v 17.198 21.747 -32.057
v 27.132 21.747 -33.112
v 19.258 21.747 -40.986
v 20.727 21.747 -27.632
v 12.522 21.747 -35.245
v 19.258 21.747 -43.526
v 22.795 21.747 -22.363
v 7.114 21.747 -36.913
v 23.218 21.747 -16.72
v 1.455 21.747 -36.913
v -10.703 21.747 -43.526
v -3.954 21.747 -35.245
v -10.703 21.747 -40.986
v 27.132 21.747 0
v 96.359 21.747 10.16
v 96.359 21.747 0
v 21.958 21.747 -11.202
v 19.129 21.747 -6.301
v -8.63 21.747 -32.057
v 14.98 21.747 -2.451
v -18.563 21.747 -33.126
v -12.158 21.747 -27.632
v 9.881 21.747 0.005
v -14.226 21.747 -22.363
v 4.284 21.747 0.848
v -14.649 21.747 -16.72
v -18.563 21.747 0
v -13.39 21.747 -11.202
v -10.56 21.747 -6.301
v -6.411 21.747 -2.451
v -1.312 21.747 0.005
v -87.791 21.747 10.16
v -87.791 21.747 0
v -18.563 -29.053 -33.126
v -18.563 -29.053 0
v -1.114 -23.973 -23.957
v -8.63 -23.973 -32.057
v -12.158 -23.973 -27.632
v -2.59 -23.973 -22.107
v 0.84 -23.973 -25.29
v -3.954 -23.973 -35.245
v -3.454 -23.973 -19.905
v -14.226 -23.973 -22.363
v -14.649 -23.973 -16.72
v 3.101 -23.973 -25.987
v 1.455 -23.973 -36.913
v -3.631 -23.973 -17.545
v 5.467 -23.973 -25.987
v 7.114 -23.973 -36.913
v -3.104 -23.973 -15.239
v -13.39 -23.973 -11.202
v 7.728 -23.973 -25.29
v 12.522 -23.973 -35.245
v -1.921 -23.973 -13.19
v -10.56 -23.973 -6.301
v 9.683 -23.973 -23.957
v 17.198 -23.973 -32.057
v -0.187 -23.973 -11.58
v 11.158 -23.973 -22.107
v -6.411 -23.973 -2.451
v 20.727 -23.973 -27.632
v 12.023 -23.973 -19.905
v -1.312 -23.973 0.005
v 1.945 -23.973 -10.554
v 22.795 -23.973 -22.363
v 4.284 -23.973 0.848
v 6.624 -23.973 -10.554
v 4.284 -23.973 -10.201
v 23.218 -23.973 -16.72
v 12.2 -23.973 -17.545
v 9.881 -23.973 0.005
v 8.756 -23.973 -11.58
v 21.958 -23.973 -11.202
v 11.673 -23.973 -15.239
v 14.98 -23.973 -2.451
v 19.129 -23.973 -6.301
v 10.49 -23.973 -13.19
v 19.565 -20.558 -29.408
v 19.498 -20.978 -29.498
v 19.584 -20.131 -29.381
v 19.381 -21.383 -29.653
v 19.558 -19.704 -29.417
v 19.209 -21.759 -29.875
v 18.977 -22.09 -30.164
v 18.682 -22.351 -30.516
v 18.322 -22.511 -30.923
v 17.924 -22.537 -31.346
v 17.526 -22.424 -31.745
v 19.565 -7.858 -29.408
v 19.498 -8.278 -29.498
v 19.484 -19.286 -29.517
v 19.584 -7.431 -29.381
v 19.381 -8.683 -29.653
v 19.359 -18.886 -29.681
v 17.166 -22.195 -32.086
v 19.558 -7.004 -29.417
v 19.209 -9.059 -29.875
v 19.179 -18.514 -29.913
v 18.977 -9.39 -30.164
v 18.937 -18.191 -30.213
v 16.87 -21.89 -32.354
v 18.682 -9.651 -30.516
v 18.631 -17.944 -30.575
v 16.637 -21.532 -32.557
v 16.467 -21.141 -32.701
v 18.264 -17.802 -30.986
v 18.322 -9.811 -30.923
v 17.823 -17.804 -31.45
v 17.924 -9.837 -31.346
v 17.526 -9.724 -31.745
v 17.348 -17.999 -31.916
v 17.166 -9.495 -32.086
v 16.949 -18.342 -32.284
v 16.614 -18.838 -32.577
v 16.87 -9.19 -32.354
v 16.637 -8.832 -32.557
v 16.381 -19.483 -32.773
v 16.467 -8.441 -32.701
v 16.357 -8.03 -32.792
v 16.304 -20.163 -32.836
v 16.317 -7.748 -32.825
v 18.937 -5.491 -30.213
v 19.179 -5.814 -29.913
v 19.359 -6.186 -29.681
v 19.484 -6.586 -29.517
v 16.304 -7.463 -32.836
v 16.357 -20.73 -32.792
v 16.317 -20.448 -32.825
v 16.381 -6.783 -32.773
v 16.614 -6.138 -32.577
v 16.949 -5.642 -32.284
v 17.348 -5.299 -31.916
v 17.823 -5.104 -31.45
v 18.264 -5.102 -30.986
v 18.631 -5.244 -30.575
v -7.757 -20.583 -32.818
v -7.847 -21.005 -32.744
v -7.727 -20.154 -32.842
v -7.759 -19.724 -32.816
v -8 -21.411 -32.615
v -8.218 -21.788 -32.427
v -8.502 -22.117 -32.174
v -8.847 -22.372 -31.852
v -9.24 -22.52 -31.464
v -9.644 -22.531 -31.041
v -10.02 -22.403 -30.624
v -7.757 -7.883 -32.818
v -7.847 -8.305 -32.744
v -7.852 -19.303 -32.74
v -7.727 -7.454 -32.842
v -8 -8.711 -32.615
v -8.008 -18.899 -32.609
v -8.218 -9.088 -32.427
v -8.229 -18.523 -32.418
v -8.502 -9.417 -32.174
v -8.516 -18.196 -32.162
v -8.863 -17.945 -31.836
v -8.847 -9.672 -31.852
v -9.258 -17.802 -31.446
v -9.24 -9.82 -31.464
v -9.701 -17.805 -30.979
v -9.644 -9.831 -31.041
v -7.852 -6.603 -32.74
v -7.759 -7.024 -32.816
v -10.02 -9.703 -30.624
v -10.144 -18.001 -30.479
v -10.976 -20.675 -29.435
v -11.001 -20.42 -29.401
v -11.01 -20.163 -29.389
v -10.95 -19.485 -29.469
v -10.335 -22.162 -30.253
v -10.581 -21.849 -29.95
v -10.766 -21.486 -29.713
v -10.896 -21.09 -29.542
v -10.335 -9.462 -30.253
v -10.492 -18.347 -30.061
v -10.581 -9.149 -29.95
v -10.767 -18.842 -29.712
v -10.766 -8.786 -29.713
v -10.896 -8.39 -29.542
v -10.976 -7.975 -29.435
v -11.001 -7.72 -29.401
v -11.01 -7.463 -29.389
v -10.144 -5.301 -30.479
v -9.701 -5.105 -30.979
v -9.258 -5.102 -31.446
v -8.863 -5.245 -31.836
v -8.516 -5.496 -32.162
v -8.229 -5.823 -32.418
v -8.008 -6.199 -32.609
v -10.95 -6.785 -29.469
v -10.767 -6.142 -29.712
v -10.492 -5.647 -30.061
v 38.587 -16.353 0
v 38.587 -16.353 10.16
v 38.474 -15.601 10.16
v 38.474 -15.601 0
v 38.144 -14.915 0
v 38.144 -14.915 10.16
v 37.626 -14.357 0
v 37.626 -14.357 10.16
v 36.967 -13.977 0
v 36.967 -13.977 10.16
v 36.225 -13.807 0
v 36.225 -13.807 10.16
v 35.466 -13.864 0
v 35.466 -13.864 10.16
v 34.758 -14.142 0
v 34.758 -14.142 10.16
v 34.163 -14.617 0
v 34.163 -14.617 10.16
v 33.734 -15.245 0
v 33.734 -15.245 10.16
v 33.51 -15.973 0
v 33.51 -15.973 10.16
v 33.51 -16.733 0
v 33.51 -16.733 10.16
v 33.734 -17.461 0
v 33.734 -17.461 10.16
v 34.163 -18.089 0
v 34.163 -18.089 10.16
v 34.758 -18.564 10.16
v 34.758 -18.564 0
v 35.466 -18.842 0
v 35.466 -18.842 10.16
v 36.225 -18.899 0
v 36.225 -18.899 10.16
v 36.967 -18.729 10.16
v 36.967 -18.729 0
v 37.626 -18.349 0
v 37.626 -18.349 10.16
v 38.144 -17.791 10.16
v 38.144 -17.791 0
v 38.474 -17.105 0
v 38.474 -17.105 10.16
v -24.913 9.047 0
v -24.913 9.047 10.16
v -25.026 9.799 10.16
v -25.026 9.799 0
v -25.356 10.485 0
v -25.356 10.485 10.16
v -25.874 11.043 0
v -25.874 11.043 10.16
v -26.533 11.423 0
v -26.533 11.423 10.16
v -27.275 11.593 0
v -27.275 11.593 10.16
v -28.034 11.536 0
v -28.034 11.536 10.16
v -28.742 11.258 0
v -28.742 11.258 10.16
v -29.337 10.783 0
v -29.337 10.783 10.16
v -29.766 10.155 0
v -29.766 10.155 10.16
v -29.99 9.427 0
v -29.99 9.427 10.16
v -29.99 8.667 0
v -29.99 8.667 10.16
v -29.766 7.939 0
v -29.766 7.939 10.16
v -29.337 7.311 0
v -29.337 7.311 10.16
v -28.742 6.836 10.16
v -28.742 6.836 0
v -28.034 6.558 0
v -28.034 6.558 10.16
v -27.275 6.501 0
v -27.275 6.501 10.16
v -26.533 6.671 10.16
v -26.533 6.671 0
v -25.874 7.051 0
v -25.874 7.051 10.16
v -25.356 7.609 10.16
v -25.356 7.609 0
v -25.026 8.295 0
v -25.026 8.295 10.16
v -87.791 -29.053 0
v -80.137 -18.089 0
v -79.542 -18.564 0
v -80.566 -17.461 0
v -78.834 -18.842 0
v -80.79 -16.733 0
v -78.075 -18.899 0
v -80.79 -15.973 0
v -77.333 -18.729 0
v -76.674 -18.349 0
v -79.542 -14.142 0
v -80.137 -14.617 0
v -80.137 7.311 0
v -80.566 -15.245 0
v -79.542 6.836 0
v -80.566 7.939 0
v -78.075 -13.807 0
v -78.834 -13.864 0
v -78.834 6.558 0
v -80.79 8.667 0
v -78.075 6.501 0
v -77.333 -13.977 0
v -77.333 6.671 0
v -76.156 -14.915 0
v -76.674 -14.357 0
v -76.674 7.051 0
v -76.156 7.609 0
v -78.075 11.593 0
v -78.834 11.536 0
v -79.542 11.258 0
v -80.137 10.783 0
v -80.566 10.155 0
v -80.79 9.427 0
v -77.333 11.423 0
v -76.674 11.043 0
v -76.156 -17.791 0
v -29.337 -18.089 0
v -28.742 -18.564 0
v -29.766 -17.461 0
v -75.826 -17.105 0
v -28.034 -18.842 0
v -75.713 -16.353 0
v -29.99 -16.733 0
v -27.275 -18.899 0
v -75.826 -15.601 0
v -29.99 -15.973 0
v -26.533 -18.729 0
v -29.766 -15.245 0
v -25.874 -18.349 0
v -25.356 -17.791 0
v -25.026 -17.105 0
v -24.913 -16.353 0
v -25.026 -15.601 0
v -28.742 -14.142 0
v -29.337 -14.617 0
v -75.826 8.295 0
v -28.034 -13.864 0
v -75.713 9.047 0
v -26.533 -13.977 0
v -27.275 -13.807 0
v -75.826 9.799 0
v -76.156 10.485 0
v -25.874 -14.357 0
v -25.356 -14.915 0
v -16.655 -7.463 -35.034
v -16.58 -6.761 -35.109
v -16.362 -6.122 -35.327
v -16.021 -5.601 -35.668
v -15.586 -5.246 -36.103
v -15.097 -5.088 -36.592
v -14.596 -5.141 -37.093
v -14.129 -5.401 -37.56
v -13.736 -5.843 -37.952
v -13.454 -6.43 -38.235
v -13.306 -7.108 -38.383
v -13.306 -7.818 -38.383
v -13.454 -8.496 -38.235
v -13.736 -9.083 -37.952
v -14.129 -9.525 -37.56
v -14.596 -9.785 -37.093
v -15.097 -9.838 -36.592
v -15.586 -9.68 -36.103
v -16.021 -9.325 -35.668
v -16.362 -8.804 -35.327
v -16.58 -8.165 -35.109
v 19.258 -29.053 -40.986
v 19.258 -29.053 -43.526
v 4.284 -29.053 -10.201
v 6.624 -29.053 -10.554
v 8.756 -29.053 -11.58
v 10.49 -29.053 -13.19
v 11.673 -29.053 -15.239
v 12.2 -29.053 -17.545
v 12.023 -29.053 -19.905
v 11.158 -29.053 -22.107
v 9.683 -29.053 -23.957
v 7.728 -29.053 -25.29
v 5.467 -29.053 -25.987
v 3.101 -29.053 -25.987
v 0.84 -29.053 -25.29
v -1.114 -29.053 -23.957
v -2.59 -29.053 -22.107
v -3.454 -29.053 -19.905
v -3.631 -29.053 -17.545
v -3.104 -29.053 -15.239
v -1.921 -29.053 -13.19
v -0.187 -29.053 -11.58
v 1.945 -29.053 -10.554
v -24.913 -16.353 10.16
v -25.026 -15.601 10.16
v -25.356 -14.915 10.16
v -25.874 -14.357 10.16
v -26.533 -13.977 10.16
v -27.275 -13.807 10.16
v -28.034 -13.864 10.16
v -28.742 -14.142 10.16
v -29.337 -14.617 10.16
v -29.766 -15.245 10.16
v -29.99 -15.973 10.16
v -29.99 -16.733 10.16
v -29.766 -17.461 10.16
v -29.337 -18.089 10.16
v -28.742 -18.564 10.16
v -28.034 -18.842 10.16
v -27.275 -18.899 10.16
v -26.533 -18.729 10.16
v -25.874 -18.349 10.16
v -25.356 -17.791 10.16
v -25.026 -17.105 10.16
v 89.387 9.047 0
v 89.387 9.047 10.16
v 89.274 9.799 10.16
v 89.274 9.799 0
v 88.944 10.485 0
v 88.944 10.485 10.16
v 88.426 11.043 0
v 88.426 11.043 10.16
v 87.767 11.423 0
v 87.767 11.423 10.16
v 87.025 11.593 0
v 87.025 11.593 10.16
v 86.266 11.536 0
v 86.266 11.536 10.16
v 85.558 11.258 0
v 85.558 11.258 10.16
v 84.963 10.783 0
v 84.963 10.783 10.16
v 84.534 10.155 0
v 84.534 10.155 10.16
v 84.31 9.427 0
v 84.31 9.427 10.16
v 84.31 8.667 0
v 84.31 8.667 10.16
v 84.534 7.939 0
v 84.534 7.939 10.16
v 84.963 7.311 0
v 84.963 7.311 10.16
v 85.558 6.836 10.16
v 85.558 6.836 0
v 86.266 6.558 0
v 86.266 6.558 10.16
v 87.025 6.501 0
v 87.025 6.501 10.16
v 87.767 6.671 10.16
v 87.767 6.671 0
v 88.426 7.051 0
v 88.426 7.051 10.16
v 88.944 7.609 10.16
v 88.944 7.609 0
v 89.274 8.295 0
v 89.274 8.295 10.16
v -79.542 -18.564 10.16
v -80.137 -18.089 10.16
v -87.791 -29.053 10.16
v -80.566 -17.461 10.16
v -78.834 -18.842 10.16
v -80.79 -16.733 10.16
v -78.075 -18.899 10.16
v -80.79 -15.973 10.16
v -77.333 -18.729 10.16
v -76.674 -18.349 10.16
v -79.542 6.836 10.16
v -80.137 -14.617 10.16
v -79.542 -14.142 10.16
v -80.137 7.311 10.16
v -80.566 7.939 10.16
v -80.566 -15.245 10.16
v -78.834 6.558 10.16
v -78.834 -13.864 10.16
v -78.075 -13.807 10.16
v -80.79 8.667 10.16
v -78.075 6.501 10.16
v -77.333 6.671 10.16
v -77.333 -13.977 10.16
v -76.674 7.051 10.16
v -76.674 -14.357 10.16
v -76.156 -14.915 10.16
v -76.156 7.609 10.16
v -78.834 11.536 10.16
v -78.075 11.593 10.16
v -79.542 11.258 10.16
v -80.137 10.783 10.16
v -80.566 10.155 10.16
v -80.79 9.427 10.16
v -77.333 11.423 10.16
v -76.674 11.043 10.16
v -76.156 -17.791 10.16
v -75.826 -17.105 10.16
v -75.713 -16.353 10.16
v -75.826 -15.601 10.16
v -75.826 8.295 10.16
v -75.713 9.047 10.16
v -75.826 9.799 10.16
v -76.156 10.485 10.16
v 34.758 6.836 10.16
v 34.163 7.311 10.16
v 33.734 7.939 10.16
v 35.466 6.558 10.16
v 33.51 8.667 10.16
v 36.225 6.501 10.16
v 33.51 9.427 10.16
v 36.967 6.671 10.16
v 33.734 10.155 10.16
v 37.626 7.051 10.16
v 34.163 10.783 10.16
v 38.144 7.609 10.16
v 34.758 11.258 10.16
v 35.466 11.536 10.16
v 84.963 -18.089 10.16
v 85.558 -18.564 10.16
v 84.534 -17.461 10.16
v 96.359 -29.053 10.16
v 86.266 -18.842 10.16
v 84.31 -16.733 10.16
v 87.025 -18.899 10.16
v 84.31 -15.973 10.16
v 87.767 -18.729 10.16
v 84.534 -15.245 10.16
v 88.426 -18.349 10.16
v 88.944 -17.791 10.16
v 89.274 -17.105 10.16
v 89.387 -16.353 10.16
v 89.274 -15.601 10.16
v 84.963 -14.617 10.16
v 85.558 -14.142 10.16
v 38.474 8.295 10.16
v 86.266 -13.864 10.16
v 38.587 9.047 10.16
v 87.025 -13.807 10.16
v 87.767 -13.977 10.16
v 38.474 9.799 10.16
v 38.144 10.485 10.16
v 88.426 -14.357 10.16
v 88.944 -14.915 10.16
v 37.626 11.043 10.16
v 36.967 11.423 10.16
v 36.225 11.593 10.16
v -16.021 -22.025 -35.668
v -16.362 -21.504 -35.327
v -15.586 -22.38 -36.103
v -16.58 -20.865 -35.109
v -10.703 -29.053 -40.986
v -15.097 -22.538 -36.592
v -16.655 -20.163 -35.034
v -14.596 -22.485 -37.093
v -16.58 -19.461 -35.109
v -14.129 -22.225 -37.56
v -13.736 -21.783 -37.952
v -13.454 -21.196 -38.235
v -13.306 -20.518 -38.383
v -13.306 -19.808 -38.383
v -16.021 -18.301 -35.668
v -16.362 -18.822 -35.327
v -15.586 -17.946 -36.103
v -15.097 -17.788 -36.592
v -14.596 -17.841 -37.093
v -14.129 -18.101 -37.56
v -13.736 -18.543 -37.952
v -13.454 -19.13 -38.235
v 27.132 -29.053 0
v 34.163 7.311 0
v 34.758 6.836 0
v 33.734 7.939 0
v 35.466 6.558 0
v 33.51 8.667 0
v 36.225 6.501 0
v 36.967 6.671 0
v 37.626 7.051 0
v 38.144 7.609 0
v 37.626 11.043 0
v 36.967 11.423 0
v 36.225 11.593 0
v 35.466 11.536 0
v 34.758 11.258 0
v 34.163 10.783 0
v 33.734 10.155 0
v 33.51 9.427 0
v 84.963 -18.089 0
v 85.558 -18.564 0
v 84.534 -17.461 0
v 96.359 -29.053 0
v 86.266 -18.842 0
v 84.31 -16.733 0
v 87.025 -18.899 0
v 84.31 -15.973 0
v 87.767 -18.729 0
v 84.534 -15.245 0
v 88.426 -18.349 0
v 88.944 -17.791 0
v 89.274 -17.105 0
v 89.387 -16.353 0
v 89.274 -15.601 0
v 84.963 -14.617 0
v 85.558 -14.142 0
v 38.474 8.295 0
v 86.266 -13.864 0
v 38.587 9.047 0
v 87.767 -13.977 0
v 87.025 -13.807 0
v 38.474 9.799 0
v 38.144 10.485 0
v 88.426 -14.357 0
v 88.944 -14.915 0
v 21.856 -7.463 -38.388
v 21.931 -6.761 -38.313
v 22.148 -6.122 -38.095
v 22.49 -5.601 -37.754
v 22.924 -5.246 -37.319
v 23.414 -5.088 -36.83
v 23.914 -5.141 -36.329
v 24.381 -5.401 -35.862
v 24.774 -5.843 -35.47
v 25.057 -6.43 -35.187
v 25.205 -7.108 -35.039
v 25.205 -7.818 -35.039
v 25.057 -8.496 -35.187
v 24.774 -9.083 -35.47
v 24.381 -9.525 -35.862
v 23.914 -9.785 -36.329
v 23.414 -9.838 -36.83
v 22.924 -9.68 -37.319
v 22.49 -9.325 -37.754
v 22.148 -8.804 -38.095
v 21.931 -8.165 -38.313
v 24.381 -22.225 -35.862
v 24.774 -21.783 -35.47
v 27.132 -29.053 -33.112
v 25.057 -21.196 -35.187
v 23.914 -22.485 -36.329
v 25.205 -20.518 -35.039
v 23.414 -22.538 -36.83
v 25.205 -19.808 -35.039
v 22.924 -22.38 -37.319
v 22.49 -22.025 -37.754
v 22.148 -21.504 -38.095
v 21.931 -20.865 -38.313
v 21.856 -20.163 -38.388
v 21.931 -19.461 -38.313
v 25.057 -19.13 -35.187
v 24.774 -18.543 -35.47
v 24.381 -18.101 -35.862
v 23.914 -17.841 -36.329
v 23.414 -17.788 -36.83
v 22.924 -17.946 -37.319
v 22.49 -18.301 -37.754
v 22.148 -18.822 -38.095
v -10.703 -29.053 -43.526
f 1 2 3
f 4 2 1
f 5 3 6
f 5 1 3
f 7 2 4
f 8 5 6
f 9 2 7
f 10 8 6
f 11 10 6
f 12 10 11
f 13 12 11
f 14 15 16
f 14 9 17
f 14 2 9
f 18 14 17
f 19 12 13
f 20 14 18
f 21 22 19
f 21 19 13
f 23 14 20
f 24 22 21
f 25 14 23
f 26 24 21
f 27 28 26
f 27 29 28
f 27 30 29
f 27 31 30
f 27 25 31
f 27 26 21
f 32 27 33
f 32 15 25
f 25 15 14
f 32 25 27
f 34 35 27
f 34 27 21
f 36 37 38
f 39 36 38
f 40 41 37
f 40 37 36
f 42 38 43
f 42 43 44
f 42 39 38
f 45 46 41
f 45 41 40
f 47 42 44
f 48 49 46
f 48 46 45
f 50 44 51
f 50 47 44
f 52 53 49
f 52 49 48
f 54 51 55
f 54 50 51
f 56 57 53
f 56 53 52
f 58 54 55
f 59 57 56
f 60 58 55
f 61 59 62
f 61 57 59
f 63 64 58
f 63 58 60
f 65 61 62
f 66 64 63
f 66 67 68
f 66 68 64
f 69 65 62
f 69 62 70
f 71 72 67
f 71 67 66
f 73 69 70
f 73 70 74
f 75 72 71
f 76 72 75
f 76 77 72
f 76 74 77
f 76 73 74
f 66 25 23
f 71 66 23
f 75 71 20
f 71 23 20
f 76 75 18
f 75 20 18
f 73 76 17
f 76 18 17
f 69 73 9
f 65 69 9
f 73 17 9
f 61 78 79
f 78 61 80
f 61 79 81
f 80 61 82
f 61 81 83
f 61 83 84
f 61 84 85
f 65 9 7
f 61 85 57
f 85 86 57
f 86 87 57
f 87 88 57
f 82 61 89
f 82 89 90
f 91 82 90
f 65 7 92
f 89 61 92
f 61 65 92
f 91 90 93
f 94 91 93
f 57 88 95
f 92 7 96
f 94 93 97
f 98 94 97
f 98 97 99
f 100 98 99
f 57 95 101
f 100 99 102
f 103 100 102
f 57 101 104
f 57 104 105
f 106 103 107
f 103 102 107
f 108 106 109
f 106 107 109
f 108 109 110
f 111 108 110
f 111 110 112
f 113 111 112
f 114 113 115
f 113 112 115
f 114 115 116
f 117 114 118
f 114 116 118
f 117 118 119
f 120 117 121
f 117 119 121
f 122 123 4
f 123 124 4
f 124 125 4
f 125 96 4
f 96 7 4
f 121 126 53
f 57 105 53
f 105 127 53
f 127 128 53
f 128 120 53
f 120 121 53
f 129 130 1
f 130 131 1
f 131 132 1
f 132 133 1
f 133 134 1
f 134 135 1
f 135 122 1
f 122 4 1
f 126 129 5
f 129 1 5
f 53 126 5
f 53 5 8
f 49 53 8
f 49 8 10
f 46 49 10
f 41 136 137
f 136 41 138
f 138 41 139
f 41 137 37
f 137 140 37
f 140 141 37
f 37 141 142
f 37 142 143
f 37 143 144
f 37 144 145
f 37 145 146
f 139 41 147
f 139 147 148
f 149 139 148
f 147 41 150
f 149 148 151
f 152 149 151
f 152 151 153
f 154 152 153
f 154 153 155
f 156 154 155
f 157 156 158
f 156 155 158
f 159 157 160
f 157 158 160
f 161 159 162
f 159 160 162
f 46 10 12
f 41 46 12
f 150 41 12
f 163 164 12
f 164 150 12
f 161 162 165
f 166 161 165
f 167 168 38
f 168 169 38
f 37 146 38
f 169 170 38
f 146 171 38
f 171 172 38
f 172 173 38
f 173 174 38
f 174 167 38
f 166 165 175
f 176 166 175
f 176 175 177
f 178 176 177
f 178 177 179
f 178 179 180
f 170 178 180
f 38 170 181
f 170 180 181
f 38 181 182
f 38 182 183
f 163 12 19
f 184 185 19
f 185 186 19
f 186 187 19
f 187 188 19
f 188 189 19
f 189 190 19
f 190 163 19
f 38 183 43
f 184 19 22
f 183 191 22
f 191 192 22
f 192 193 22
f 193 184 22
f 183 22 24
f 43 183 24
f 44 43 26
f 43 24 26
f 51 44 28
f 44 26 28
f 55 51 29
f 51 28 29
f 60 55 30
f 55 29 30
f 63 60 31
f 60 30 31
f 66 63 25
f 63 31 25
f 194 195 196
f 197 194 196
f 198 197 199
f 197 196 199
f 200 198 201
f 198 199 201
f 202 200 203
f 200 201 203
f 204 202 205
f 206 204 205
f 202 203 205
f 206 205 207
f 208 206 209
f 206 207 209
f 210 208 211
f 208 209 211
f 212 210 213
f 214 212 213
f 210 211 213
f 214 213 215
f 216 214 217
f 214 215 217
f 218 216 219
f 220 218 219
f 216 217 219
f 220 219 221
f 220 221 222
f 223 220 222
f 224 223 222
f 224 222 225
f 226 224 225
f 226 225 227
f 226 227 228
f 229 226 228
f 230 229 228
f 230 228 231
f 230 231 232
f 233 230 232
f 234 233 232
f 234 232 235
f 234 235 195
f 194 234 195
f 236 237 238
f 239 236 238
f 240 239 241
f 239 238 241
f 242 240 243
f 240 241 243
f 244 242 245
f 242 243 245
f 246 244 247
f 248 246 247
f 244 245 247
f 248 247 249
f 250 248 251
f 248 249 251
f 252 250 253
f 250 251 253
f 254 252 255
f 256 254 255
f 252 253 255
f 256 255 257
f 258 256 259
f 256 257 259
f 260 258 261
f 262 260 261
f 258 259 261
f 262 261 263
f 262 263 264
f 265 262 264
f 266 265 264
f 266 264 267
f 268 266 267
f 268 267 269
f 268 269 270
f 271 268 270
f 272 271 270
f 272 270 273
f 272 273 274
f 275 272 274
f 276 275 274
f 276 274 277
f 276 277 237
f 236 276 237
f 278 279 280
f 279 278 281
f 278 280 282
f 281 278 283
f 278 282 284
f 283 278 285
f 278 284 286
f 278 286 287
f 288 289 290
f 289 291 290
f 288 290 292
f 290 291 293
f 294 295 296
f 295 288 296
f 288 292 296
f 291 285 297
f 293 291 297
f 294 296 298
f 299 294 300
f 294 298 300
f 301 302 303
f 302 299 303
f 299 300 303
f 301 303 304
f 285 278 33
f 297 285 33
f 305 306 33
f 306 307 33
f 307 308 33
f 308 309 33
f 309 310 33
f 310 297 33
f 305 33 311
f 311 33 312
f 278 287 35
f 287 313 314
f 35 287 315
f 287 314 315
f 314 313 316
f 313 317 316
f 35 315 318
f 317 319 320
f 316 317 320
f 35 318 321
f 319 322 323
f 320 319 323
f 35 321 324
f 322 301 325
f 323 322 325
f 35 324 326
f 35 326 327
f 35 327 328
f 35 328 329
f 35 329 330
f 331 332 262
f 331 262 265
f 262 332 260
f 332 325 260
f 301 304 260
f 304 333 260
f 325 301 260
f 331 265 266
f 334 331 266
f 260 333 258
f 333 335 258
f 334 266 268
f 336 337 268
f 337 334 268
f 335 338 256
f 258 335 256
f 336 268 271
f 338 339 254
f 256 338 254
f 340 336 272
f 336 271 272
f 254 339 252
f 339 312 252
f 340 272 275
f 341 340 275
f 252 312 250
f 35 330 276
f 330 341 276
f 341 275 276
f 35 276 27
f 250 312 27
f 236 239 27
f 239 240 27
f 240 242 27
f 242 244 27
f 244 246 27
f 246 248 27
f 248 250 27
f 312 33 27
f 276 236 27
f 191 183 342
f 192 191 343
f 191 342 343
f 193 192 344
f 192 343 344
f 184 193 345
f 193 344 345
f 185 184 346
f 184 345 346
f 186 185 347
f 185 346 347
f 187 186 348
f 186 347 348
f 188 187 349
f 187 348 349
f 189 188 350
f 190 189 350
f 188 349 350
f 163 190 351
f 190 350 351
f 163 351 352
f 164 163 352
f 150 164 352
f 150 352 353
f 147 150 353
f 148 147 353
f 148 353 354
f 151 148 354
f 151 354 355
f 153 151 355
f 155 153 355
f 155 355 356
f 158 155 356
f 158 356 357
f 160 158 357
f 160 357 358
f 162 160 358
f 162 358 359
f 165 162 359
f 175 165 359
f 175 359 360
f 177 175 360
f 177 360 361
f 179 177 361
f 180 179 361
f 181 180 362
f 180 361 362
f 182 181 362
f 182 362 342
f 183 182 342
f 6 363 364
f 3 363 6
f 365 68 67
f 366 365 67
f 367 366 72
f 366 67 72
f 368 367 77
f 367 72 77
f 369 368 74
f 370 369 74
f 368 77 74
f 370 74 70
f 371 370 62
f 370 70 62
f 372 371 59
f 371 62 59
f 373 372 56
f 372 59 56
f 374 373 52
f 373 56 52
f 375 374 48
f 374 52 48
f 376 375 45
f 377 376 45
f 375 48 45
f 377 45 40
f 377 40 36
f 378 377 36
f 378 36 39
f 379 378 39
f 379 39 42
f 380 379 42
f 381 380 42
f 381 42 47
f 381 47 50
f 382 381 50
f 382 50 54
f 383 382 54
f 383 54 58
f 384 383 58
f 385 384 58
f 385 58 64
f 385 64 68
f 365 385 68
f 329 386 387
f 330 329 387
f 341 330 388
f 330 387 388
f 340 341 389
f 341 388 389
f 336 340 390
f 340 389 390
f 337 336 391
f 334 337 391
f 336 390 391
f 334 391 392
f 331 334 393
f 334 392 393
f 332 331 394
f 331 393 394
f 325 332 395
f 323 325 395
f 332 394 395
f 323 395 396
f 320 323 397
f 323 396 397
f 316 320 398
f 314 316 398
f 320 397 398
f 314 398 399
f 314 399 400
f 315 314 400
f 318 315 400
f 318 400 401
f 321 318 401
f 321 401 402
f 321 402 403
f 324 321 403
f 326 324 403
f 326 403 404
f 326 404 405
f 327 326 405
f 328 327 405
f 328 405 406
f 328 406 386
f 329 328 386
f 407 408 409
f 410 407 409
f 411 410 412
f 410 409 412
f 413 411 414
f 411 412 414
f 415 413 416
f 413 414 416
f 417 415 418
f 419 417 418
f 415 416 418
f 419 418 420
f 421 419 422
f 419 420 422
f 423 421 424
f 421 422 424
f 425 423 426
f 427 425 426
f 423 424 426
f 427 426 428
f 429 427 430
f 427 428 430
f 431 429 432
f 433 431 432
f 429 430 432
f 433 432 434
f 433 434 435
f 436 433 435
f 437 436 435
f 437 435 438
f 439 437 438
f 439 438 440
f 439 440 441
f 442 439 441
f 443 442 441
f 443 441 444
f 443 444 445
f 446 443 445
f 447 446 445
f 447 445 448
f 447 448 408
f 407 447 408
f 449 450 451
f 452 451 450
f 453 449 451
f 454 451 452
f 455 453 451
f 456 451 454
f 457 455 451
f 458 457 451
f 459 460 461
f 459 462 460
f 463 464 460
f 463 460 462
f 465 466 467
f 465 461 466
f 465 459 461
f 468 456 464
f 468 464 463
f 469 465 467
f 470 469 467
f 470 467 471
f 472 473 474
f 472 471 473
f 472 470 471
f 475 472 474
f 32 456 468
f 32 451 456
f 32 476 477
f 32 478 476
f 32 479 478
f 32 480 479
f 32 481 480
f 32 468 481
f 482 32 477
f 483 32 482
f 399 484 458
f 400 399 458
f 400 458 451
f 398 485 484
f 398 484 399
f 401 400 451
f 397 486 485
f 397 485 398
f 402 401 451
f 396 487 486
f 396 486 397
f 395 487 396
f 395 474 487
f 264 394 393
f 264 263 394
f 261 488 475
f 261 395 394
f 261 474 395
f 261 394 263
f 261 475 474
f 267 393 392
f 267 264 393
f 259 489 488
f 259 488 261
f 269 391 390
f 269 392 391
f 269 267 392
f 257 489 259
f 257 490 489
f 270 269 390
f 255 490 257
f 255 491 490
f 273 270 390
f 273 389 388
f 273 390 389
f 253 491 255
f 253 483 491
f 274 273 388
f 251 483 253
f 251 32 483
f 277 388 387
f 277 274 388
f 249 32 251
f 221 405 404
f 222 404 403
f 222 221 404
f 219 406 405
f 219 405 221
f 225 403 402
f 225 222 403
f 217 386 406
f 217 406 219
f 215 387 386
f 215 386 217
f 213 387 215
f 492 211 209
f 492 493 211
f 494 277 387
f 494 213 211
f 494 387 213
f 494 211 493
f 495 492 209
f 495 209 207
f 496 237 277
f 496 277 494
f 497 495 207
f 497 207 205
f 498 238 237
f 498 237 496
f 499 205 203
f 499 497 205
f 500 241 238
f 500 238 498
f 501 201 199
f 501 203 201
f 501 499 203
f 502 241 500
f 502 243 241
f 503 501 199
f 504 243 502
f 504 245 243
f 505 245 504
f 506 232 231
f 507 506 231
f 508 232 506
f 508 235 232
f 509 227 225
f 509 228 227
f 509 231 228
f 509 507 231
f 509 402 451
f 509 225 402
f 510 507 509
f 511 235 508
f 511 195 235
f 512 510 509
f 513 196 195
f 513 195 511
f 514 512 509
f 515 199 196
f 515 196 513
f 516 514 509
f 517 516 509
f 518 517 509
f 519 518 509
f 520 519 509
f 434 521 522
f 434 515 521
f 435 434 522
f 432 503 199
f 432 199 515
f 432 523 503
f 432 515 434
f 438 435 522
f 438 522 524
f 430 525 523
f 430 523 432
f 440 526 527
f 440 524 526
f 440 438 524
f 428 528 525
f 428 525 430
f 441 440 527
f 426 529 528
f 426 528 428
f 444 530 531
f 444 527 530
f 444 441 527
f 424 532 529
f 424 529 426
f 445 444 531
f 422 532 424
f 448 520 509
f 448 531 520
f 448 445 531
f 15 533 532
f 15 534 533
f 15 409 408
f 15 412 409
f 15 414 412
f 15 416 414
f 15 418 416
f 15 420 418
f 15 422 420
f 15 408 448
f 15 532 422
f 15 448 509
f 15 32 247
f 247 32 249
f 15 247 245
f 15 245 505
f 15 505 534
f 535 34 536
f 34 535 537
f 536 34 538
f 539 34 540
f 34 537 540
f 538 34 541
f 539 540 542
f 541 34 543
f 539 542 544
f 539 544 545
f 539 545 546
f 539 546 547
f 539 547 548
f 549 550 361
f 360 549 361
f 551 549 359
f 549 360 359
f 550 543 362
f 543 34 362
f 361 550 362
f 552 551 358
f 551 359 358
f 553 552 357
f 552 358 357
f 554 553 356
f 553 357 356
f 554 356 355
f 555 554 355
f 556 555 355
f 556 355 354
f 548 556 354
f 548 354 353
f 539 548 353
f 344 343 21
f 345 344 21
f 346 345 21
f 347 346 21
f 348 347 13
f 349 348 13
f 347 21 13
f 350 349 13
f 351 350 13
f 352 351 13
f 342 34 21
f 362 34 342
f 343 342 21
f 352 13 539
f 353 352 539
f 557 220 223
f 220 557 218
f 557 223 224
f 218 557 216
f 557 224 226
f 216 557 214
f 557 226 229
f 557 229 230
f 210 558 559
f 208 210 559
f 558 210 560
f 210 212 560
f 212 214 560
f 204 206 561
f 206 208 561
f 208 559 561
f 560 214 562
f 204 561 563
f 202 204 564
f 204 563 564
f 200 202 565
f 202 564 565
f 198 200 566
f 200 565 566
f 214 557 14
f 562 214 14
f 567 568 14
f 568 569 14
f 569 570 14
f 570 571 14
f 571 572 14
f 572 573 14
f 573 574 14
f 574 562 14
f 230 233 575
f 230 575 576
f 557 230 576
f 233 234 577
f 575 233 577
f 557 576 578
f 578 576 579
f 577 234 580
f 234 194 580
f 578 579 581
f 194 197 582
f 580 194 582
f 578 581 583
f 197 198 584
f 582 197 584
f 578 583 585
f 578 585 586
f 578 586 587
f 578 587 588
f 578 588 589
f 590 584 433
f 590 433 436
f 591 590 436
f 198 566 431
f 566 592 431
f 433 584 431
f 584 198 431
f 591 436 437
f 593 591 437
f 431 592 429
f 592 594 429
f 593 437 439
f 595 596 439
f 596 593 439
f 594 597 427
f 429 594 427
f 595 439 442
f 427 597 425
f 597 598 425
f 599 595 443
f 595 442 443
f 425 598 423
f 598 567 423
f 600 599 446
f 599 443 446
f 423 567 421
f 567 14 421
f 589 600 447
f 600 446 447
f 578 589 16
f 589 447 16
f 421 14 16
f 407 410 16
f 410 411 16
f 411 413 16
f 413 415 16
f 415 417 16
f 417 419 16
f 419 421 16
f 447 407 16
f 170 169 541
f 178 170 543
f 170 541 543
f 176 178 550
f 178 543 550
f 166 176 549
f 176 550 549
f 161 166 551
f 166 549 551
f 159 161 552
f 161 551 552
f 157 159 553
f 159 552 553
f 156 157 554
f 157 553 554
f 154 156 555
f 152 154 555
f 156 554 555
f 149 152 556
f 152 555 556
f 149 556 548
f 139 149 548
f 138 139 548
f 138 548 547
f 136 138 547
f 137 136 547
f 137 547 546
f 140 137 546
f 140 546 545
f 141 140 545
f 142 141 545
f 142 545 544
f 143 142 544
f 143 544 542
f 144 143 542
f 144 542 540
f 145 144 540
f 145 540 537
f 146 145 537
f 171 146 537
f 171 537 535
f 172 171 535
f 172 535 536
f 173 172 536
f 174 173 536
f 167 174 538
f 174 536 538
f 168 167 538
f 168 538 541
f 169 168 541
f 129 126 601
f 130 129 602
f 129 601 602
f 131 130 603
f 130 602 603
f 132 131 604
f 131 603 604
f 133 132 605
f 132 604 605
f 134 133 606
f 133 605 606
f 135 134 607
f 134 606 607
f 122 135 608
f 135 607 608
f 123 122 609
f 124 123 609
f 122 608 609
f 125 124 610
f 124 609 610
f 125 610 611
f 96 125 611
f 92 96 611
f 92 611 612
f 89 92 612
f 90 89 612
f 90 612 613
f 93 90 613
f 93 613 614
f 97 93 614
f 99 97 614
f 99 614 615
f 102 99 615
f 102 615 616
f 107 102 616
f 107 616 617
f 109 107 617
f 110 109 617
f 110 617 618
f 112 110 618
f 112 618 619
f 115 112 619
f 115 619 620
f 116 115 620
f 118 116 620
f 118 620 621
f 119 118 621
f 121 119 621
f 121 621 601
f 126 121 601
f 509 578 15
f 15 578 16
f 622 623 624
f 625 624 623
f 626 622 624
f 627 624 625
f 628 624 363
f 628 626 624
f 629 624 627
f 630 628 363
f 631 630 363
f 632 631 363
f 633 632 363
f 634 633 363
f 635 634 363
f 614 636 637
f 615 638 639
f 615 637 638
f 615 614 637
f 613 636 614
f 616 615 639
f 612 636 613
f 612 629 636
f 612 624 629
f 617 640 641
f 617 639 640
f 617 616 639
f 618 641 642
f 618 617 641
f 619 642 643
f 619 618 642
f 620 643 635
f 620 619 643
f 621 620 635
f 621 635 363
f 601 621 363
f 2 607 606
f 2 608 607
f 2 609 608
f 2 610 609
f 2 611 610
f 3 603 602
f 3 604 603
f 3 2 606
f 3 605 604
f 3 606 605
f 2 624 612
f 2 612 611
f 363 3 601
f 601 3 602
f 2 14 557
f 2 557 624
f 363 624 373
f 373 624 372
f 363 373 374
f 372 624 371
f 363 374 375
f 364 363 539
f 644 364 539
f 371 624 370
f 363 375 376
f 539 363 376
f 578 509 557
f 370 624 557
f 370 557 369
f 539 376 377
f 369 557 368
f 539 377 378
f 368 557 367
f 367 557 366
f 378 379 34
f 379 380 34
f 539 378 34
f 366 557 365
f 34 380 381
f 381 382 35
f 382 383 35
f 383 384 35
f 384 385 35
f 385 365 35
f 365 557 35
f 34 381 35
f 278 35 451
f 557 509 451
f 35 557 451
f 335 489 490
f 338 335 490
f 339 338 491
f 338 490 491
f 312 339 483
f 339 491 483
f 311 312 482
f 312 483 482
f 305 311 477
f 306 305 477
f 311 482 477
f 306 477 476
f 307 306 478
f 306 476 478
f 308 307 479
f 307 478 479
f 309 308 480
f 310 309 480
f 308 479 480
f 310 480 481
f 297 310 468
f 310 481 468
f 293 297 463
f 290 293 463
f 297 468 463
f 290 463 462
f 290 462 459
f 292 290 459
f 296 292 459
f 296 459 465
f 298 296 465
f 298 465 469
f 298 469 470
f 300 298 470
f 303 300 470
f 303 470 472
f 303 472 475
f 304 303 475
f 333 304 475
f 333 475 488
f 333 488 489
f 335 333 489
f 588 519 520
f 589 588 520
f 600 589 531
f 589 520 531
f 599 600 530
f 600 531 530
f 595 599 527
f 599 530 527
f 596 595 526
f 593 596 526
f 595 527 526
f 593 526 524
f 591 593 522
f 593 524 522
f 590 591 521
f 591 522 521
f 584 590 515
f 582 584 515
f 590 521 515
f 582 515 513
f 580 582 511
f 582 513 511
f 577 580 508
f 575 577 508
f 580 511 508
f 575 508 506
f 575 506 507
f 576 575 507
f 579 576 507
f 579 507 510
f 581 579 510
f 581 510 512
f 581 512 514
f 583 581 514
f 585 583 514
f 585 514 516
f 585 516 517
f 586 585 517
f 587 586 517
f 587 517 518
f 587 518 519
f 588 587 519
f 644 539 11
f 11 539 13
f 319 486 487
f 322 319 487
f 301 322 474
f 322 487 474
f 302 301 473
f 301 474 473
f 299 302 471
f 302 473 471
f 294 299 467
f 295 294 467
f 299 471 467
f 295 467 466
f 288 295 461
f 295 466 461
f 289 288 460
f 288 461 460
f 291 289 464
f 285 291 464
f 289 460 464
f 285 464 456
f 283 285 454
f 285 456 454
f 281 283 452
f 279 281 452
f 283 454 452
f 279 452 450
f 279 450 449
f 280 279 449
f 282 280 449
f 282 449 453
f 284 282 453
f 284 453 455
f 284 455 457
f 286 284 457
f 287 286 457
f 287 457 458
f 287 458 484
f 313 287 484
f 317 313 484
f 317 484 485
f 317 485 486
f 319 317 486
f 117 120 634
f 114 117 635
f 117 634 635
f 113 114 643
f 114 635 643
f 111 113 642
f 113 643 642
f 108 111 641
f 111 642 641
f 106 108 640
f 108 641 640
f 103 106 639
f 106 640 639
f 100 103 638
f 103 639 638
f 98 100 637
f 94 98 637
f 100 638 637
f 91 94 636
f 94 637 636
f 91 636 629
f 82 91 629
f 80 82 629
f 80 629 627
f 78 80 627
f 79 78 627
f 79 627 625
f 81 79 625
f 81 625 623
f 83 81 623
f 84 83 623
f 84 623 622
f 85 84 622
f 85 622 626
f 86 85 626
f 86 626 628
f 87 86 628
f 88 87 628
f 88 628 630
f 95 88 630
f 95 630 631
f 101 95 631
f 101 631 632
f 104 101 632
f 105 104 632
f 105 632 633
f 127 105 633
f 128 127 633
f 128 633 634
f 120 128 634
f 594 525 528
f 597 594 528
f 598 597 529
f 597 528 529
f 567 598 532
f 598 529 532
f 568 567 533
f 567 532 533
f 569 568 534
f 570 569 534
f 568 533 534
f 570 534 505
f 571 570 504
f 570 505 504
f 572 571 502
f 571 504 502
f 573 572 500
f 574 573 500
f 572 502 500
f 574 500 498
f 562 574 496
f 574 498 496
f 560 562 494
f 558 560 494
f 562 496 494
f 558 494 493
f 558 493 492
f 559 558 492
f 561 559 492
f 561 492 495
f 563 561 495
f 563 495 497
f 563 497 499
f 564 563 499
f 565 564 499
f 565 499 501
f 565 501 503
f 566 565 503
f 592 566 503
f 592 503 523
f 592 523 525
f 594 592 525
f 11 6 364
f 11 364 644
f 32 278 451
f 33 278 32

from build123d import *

# Parameters (mm, degrees)
SKETCH1_W                           = 184.15
SKETCH1_H                           = 50.8
BOSS_EXTRUDE1_DEPTH                 = 10.16
CUT_EXTRUDE1_DEPTH                  = 110.402922012
CUT_EXTRUDE1_DEPTH_BACK             = 110.402922012
SKETCH7_R                           = 22.847252038
BOSS_EXTRUDE2_DEPTH                 = 50.8
SKETCH8_R                           = 18.9865
CUT_EXTRUDE2_DEPTH                  = 45.72
SKETCH9_R                           = 7.9375
CUT_EXTRUDE3_DEPTH                  = 115.259711281
BOSS_EXTRUDE3_DEPTH                 = 50.8
BOSS_EXTRUDE4_START                 = -50.8
BOSS_EXTRUDE4_DEPTH                 = 50.8
BOSS_EXTRUDE5_START                 = -50.8
BOSS_EXTRUDE5_DEPTH                 = 50.8
CUT_EXTRUDE6_DEPTH                  = 117.385579957
F_10_CLEARANCE_HOLE1_D              = 5.1054
F_10_CLEARANCE_HOLE2_D              = 5.1054
SKETCH31_W                          = 29.960646913
SKETCH31_H                          = 50.8
BOSS_EXTRUDE6_DEPTH                 = 2.54
F_3_16_0_1875_DIAMETER_HOLE3_REACH  = 132.668
F_3_16_0_1875_DIAMETER_HOLE3_BORE_R = 2.38125
F_3_16_0_1875_DIAMETER_HOLE4_REACH  = 129.945
F_3_16_0_1875_DIAMETER_HOLE4_BORE_R = 2.38125


with BuildPart() as part:
    # Sketch1 → Boss-Extrude1 (new body)
    with BuildSketch(Plane.XY):
        with Locations((4.284398839, -3.653036721)):
            Rectangle(SKETCH1_W, SKETCH1_H)
    extrude(amount=BOSS_EXTRUDE1_DEPTH)

    # Sketch6 → Cut-Extrude1 (cut, two sides: drawn at the far end of the back side and taken through both)
    with BuildSketch(Plane(origin=(0, 21.746963279, 0), x_dir=(1, 0, 0), z_dir=(0, 1, 0)).offset(-CUT_EXTRUDE1_DEPTH_BACK)):
        with BuildLine():
            Line((189.051531618, 108.11571126), (10.888398839, 0))
            ThreePointArc((10.888398839, 0), (4.284398839, -1.847030056), (-2.319601161, 0))
            Line((-2.319601161, 0), (-180.48273394, 108.11571126))
            Line((-180.48273394, 108.11571126), (-180.48273394, 524.918345142))
            Line((-180.48273394, 524.918345142), (189.051531618, 524.918345142))
            Line((189.051531618, 524.918345142), (189.051531618, 108.11571126))
        make_face()
    extrude(amount=CUT_EXTRUDE1_DEPTH + CUT_EXTRUDE1_DEPTH_BACK, mode=Mode.SUBTRACT)

    # Sketch7 → Boss-Extrude2 (add, through all)
    with BuildSketch(Plane(origin=(0, 21.746963279, 0), x_dir=(1, 0, 0), z_dir=(0, 1, 0))):
        with Locations((4.284398839, 18.138470809)):
            Circle(SKETCH7_R)
    extrude(amount=-BOSS_EXTRUDE2_DEPTH)

    # Sketch8 → Cut-Extrude2 (cut)
    with BuildSketch(Plane(origin=(0, 21.746963279, 0), x_dir=(1, 0, 0), z_dir=(0, 1, 0))):
        with Locations(Location((4.284398839, 18.138470809, 0), (0, 0, 270))):
            Circle(SKETCH8_R)
    extrude(amount=-CUT_EXTRUDE2_DEPTH, mode=Mode.SUBTRACT)

    # Sketch9 → Cut-Extrude3 (cut, through all)
    with BuildSketch(Plane(origin=(0, -23.973036721, 0), x_dir=(1, 0, 0), z_dir=(0, 1, 0))):
        with Locations(Location((4.284398839, 18.138470809, 0), (0, 0, 270))):
            Circle(SKETCH9_R)
    extrude(amount=-CUT_EXTRUDE3_DEPTH, mode=Mode.SUBTRACT)

    # Sketch12 → Boss-Extrude3 (add)
    with BuildSketch(Plane(origin=(0, 21.746963279, 0), x_dir=(1, 0, 0), z_dir=(0, 1, 0))):
        with BuildLine():
            Line((27.131650877, 18.138470763), (27.131650877, 0))
            Line((27.131650877, 0), (18.176583779, 0))
            ThreePointArc((18.176583779, 0), (24.770920949, 8.024157287), (27.131650877, 18.138470763))
        make_face()
        with BuildLine():
            Line((-18.562853199, 18.138470775), (-18.562853199, 0))
            Line((-18.562853199, 0), (-9.607786101, 0))
            ThreePointArc((-9.607786101, 0), (-16.202123271, 8.024157294), (-18.562853199, 18.138470775))
        make_face()
    extrude(amount=-BOSS_EXTRUDE3_DEPTH)

    # Sketch16 → Boss-Extrude4 (add)
    with BuildSketch(Plane.XZ.offset(29.053036721).offset(BOSS_EXTRUDE4_START)):
        with BuildLine():
            Line((-18.562853199, -18.138470775), (-18.562853199, -40.985722847))
            Line((-18.562853199, -40.985722847), (4.284398845, -40.985722847))
            ThreePointArc((4.284398845, -40.985722847), (-11.871048017, -34.293917645), (-18.562853199, -18.138470775))
        make_face()
    extrude(amount=BOSS_EXTRUDE4_DEPTH)

    # Sketch18 → Boss-Extrude5 (add)
    with BuildSketch(Plane.XZ.offset(29.053036721).offset(BOSS_EXTRUDE5_START)):
        with BuildLine():
            Line((27.131650877, -18.138470763), (27.131650877, -40.985722847))
            Line((27.131650877, -40.985722847), (4.284398839, -40.985722847))
            ThreePointArc((4.284398839, -40.985722847), (20.439845703, -34.29391764), (27.131650877, -18.138470763))
        make_face()
    extrude(amount=BOSS_EXTRUDE5_DEPTH)

    # Sketch19 → Cut-Extrude6 (cut, through all)
    with BuildSketch(Plane(origin=(0, 21.746963279, 0), x_dir=(1, 0, 0), z_dir=(0, 1, 0))):
        Polygon((19.257650877, 40.985722847), (27.131650877, 40.985722847), (27.131650877, 33.111722847), align=None)
        Polygon((-18.562853199, 40.985722847), (-18.562853199, 33.125865684), (-10.702996036, 40.985722847), align=None)
    extrude(amount=-CUT_EXTRUDE6_DEPTH, mode=Mode.SUBTRACT)

    # #10 Clearance Hole1 (through all)
    with Locations(Plane(origin=(0, 0, 0), x_dir=(-1, 0, 0), z_dir=(0, 0, -1))):
        with Locations((78.265601161, 9.046963279), (78.265601161, -16.353036721), (-86.834398839, -16.353036721), (-86.834398839, 9.046963279)):
            Hole(F_10_CLEARANCE_HOLE1_D / 2)

    # #10 Clearance Hole2 (through all)
    with Locations(Plane(origin=(0, 0, 0), x_dir=(-1, 0, 0), z_dir=(0, 0, -1))):
        with Locations((27.465601161, -16.353036721), (27.465601161, 9.046963279), (-36.034398839, 9.046963279), (-36.034398839, -16.353036721)):
            Hole(F_10_CLEARANCE_HOLE2_D / 2)

    # Sketch31 → Boss-Extrude6 (add)
    with BuildSketch(Plane(origin=(0, 0, -40.985722847), x_dir=(-1, 0, 0), z_dir=(0, 0, -1))):
        with Locations((-4.27732742, -3.653036721)):
            Rectangle(SKETCH31_W, SKETCH31_H)
    extrude(amount=BOSS_EXTRUDE6_DEPTH)

    # 3/16 (0.1875) Diameter Hole3 bore → 3/16 (0.1875) Diameter Hole3 (cut, up to next)
    with BuildSketch(Plane(origin=(-25.844359441, 0, -25.844359441), x_dir=(-0.7071067811865462, 0, 0.7071067811865488), z_dir=(-0.7071067811865488, 0, -0.7071067811865462)), mode=Mode.PRIVATE) as f_3_16_0_1875_diameter_hole3_sk1:
        with Locations((-15.377604883, -20.163036721)):
            Circle(F_3_16_0_1875_DIAMETER_HOLE3_BORE_R)
    f_3_16_0_1875_diameter_hole3_tool1 = extrude(f_3_16_0_1875_diameter_hole3_sk1.sketch, amount=-F_3_16_0_1875_DIAMETER_HOLE3_REACH, mode=Mode.PRIVATE) & part.part
    # 3/16 (0.1875) Diameter Hole3 bore → 3/16 (0.1875) Diameter Hole3 (cut, up to next)
    with BuildSketch(Plane(origin=(-25.844359441, 0, -25.844359441), x_dir=(-0.7071067811865462, 0, 0.7071067811865488), z_dir=(-0.7071067811865488, 0, -0.7071067811865462)), mode=Mode.PRIVATE) as f_3_16_0_1875_diameter_hole3_sk2:
        with Locations((-15.377604883, -7.463036721)):
            Circle(F_3_16_0_1875_DIAMETER_HOLE3_BORE_R)
    f_3_16_0_1875_diameter_hole3_tool2 = extrude(f_3_16_0_1875_diameter_hole3_sk2.sketch, amount=-F_3_16_0_1875_DIAMETER_HOLE3_REACH, mode=Mode.PRIVATE) & part.part
    add(f_3_16_0_1875_diameter_hole3_tool1.solids().sort_by_distance((-14.970751, -20.163037, -36.717968))[0], mode=Mode.SUBTRACT)
    add(f_3_16_0_1875_diameter_hole3_tool2.solids().sort_by_distance((-14.970751, -7.463037, -36.717968))[0], mode=Mode.SUBTRACT)

    # 3/16 (0.1875) Diameter Hole4 bore → 3/16 (0.1875) Diameter Hole4 (cut, up to next)
    with BuildSketch(Plane(origin=(30.121686862, 0, -30.121686862), x_dir=(-0.7071067811865562, 0, -0.7071067811865389), z_dir=(0.7071067811865389, 0, -0.7071067811865562)), mode=Mode.PRIVATE) as f_3_16_0_1875_diameter_hole4_sk1:
        with Locations((9.308549442, -20.163036721)):
            Circle(F_3_16_0_1875_DIAMETER_HOLE4_BORE_R)
    f_3_16_0_1875_diameter_hole4_tool1 = extrude(f_3_16_0_1875_diameter_hole4_sk1.sketch, amount=-F_3_16_0_1875_DIAMETER_HOLE4_REACH, mode=Mode.PRIVATE) & part.part
    # 3/16 (0.1875) Diameter Hole4 bore → 3/16 (0.1875) Diameter Hole4 (cut, up to next)
    with BuildSketch(Plane(origin=(30.121686862, 0, -30.121686862), x_dir=(-0.7071067811865562, 0, -0.7071067811865389), z_dir=(0.7071067811865389, 0, -0.7071067811865562)), mode=Mode.PRIVATE) as f_3_16_0_1875_diameter_hole4_sk2:
        with Locations((9.308549442, -7.463036721)):
            Circle(F_3_16_0_1875_DIAMETER_HOLE4_BORE_R)
    f_3_16_0_1875_diameter_hole4_tool2 = extrude(f_3_16_0_1875_diameter_hole4_sk2.sketch, amount=-F_3_16_0_1875_DIAMETER_HOLE4_REACH, mode=Mode.PRIVATE) & part.part
    add(f_3_16_0_1875_diameter_hole4_tool1.solids().sort_by_distance((23.539548, -20.163037, -36.703825))[0], mode=Mode.SUBTRACT)
    add(f_3_16_0_1875_diameter_hole4_tool2.solids().sort_by_distance((23.539548, -7.463037, -36.703825))[0], mode=Mode.SUBTRACT)


solid = part.part
